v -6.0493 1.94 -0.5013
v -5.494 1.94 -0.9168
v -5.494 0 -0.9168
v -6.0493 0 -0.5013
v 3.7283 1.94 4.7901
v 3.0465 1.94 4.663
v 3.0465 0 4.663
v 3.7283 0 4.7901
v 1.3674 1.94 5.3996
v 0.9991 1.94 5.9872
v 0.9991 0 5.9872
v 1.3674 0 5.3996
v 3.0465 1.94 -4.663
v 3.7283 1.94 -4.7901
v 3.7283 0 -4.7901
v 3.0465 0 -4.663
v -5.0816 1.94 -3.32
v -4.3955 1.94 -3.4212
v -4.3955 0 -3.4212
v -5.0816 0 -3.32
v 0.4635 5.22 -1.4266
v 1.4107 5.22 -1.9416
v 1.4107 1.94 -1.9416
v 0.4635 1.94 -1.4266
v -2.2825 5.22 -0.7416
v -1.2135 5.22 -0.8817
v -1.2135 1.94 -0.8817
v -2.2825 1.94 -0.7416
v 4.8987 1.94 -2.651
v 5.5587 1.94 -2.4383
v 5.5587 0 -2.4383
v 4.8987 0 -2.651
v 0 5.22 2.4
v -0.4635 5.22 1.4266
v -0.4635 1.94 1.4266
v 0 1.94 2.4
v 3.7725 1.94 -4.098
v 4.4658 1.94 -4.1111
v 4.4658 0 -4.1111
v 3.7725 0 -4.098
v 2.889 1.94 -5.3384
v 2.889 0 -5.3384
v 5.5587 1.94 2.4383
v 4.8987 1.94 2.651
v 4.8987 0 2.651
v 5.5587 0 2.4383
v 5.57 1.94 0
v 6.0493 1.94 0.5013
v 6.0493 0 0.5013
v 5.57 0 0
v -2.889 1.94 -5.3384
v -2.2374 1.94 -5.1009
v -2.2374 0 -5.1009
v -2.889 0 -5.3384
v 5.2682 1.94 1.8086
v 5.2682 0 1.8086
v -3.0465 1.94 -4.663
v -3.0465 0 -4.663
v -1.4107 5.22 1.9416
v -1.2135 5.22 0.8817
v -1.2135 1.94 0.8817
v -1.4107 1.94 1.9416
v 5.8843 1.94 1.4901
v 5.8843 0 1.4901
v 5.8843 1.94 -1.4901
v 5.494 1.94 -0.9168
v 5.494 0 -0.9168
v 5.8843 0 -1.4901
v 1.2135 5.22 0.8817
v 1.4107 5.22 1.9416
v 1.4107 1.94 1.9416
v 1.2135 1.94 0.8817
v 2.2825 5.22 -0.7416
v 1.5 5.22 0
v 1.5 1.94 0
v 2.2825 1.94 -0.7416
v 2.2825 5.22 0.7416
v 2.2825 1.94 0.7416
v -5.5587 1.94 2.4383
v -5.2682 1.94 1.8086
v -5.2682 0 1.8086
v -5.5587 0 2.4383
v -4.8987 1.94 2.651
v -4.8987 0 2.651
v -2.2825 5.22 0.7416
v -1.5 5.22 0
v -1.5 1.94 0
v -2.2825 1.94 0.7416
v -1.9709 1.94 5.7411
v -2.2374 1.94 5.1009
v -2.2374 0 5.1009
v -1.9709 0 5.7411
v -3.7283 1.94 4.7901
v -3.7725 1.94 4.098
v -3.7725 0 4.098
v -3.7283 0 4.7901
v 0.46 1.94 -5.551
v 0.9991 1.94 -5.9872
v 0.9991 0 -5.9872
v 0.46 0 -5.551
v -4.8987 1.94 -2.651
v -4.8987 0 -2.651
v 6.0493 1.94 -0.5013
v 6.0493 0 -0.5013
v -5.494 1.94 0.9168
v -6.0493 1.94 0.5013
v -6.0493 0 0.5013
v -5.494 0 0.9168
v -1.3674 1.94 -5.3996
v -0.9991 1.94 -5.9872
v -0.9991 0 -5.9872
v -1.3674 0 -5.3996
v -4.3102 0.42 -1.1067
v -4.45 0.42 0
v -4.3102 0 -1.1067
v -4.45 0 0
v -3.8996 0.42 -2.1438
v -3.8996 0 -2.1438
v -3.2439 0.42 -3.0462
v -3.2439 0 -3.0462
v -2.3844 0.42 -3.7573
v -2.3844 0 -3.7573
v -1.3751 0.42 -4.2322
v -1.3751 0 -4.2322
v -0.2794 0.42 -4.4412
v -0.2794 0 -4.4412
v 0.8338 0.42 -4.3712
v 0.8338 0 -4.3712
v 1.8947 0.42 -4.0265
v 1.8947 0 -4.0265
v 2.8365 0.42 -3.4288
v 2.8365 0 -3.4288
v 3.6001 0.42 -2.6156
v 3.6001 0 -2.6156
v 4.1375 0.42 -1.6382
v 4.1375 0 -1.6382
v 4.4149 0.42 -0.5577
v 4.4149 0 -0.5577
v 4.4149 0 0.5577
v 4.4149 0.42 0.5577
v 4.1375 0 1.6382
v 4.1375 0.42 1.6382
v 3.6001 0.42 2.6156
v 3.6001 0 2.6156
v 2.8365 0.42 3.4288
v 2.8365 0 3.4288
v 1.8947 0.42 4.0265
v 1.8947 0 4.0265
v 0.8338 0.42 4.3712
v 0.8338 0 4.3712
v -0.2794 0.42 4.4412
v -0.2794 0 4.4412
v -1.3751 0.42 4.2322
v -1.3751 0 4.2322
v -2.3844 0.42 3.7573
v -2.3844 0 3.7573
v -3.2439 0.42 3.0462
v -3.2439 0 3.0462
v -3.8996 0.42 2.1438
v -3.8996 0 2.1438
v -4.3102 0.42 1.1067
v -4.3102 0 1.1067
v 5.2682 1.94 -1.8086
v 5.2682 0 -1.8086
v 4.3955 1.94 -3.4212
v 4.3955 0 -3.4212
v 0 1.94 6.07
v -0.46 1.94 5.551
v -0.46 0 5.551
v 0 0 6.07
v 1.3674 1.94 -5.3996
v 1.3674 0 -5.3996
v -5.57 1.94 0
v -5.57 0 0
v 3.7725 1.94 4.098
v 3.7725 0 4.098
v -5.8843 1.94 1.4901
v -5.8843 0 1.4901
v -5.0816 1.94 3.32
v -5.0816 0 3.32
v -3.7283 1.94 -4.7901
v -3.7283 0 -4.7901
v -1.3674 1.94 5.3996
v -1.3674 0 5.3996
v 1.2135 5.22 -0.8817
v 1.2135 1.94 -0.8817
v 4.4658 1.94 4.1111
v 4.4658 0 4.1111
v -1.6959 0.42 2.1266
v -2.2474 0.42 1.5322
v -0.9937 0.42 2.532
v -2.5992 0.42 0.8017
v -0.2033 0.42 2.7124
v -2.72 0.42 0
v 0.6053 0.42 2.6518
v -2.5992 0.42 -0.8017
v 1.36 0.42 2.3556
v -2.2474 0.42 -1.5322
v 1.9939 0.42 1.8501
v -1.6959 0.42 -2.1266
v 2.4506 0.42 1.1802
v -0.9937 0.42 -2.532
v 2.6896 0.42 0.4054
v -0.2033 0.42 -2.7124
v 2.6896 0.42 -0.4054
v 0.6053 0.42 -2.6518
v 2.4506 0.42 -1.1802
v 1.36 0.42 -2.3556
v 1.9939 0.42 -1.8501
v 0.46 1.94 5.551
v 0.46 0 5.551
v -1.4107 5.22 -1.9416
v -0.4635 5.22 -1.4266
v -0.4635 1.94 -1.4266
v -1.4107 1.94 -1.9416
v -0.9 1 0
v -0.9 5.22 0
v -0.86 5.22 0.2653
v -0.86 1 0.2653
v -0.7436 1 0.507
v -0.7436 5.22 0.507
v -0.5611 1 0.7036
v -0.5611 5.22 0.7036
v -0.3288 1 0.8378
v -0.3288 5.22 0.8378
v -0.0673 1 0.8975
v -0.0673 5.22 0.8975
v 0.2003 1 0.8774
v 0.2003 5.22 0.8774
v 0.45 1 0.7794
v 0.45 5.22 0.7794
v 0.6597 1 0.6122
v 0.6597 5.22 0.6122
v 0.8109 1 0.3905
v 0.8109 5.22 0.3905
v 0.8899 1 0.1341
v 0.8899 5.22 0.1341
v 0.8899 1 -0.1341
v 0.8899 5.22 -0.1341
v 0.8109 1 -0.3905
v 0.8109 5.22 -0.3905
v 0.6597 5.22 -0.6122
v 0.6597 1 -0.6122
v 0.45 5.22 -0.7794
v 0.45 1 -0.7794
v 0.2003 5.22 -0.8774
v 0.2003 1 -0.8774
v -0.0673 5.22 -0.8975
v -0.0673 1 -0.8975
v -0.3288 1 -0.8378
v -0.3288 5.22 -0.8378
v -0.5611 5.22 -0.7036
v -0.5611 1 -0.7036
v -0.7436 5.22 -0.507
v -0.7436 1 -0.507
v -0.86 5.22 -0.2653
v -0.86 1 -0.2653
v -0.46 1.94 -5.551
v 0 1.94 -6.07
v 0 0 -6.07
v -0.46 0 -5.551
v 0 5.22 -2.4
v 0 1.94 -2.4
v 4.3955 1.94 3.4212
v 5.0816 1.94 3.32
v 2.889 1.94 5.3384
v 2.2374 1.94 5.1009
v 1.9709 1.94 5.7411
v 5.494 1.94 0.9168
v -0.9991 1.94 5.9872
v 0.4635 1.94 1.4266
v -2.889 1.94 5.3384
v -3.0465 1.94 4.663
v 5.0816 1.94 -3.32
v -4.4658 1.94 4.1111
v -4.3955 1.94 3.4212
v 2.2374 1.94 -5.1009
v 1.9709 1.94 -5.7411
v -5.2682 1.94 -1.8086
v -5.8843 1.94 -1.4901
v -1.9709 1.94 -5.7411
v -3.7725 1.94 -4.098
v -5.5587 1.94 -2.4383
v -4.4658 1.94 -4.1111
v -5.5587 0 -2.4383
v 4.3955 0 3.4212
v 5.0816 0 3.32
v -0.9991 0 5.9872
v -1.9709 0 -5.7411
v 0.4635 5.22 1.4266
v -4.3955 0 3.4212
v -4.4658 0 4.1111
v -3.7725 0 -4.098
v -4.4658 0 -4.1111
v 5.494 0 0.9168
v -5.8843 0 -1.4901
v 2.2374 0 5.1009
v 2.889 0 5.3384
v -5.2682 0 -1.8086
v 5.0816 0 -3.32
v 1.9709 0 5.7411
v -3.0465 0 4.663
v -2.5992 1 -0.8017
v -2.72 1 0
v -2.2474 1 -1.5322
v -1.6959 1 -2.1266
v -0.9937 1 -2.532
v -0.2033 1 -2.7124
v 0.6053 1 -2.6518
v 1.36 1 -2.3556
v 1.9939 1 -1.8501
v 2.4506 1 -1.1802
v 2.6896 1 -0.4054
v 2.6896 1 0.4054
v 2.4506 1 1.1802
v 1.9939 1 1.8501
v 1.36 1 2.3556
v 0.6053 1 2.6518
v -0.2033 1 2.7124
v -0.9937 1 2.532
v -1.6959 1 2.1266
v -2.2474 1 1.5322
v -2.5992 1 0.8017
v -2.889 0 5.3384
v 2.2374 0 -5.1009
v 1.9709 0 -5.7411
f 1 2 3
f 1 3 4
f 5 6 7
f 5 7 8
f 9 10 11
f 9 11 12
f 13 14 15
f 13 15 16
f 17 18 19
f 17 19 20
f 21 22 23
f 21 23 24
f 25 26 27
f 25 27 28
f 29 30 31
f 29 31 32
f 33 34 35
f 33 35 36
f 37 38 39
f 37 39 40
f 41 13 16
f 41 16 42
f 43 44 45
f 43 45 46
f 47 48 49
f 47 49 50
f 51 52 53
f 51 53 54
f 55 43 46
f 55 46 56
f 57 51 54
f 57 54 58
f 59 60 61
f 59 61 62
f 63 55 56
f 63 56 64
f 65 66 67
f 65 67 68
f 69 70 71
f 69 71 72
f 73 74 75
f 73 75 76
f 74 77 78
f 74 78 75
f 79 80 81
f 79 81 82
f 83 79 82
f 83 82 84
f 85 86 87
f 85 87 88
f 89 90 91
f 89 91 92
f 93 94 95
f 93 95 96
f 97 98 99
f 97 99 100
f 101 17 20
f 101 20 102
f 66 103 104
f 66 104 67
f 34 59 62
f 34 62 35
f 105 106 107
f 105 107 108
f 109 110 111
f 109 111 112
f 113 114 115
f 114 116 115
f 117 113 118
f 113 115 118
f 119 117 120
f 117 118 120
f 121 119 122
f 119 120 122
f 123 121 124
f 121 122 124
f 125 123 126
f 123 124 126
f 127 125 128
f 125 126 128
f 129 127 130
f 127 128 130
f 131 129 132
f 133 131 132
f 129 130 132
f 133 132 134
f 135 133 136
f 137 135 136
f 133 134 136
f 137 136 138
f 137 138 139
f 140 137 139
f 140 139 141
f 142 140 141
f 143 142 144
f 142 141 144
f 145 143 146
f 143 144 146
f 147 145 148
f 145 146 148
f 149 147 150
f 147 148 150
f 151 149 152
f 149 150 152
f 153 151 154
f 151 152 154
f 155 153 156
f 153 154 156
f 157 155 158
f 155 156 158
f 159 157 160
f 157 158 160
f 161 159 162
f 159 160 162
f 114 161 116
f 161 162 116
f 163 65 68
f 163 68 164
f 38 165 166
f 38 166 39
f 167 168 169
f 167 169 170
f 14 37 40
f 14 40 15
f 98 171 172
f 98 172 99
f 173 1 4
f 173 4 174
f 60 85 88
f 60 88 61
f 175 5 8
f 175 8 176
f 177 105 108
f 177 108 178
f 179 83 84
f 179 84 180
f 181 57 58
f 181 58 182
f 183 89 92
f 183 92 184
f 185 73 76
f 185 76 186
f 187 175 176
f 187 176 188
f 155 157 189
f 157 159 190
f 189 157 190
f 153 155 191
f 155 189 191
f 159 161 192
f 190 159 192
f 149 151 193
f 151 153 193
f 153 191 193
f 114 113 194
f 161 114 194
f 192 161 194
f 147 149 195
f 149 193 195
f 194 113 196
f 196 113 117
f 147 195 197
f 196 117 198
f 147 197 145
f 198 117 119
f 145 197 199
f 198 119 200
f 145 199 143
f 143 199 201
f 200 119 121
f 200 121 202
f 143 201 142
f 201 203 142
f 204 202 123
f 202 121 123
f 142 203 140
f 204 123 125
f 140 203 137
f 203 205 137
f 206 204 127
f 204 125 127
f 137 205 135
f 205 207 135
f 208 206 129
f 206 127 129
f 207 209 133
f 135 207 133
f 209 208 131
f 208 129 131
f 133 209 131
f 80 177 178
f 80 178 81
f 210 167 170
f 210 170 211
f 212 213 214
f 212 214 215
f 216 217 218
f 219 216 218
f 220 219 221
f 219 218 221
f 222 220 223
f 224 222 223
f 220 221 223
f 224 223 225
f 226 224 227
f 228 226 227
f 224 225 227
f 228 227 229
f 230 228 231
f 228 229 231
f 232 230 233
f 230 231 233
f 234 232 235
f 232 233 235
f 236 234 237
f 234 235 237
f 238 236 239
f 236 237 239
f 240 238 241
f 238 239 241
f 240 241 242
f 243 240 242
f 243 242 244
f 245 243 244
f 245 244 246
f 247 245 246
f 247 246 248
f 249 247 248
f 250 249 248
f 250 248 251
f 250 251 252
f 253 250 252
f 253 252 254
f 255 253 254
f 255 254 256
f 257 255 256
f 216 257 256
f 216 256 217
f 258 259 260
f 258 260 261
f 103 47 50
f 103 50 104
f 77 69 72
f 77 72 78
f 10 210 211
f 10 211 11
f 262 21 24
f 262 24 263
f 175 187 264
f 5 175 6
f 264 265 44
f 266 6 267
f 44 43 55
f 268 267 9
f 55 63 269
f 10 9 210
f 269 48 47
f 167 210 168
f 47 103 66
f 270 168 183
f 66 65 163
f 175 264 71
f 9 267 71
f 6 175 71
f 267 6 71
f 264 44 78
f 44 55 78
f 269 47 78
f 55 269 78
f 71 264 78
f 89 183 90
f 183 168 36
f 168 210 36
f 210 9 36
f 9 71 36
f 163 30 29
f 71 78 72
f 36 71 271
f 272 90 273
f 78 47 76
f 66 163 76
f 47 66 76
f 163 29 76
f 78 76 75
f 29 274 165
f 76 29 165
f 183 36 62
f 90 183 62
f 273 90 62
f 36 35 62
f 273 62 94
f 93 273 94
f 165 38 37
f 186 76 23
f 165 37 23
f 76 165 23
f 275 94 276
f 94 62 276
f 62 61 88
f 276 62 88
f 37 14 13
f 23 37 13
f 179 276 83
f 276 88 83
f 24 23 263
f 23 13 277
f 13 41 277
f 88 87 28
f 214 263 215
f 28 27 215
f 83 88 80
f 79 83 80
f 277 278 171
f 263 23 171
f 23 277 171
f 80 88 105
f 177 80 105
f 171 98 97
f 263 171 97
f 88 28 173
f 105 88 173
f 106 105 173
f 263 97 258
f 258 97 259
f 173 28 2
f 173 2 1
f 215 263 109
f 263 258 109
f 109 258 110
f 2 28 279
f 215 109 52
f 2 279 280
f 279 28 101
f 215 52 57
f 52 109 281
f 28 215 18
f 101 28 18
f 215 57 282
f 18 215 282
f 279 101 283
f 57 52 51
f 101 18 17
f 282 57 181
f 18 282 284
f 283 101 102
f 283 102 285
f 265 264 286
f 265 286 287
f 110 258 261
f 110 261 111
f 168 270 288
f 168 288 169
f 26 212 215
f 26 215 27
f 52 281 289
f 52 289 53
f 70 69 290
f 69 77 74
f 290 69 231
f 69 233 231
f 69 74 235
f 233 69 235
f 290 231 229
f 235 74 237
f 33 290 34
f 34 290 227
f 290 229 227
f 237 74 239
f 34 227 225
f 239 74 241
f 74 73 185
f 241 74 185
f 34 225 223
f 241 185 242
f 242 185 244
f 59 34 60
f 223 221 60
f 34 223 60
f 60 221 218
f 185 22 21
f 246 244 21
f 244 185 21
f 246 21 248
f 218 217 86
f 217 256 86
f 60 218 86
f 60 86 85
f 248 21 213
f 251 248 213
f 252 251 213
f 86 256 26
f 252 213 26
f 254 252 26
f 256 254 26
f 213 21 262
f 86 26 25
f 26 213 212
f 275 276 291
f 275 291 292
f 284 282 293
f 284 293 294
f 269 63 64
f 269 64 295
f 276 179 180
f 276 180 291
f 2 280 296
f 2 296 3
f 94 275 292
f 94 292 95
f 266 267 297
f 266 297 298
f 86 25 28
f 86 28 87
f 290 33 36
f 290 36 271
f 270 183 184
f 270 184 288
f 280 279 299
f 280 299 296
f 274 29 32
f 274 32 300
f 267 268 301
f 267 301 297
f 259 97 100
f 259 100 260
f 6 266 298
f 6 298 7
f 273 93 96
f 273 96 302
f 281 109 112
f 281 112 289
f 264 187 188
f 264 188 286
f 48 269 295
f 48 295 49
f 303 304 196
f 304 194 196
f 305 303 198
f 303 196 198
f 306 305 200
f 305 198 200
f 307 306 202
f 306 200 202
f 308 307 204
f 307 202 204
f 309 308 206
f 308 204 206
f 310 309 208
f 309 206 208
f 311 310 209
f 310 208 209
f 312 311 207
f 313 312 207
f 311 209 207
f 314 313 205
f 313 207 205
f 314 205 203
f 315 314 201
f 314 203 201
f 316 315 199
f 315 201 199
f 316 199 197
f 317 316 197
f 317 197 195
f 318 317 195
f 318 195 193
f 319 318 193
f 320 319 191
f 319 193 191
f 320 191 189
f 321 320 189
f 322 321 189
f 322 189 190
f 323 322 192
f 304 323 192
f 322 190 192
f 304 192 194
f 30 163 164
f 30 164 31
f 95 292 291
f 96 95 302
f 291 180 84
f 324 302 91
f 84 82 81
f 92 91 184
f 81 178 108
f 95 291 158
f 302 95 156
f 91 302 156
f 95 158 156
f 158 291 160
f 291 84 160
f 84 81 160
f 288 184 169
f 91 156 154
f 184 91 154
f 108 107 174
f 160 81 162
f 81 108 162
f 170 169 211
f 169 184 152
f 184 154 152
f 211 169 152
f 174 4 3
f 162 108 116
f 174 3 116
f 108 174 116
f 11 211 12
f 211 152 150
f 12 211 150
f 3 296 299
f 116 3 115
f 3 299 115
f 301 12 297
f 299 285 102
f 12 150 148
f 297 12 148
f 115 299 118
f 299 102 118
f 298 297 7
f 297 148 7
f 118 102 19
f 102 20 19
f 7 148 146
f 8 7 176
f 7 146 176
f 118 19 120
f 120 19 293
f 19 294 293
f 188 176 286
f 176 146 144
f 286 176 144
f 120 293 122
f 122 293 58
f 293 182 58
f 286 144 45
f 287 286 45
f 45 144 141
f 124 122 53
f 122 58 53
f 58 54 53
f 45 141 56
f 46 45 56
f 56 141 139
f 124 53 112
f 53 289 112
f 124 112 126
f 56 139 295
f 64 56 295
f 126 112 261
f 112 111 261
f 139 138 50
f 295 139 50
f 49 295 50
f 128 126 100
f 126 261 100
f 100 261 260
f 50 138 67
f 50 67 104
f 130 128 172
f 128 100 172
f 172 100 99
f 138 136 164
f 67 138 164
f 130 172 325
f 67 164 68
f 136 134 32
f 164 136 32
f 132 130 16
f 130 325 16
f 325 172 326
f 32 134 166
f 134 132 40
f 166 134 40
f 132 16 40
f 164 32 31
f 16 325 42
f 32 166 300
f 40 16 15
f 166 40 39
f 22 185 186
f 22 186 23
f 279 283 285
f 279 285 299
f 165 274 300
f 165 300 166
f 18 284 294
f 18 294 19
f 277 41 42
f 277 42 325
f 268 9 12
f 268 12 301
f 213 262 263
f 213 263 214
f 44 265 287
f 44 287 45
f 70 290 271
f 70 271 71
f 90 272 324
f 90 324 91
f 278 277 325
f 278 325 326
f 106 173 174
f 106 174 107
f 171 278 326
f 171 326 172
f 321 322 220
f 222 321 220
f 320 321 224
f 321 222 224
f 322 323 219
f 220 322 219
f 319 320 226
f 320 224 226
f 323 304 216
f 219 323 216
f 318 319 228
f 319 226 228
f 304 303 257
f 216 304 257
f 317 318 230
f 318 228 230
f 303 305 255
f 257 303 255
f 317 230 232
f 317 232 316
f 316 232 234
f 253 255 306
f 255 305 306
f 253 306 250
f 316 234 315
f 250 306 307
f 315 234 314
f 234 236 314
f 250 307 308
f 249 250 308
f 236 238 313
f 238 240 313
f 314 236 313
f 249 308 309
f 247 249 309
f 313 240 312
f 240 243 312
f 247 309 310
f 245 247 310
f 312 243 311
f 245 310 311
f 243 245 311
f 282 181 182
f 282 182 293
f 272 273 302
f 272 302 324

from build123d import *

# Parameters (mm, degrees)
SKETCH2_R          = 6.57
CUT_EXTRUDE1_DEPTH = 10.189570175
SKETCH3_R          = 2.9
CUT_EXTRUDE2_DEPTH = 3.28
SKETCH4_R          = 0.9
CUT_EXTRUDE3_DEPTH = 11.034288305


with BuildPart() as part:
    # Sketch1 → Revolve1 (revolve)
    with BuildSketch(Plane.XY, mode=Mode.PRIVATE) as revolve1_sk:
        Polygon((0, 5.22), (0, 1), (2.72, 1), (2.72, 0.42), (4.45, 0.42), (4.45, 0), (6.07, 0), (6.07, 1.94), (2.4, 1.94), (2.4, 5.22), align=None)
    revolve(revolve1_sk.sketch.rotate(Axis((0, 5.22, 0), (0, -1, 0)), 180), axis=Axis((0, 5.22, 0), (0, -1, 0)))

    # Sketch2 → Cut-Extrude1 (cut, through all)
    with BuildSketch(Plane(origin=(0, 1.94, 0), x_dir=(1, 0, 0), z_dir=(0, 1, 0))):
        Circle(SKETCH2_R)
        Polygon((0, 6.07), (-0.459966954, 5.550975626), (-0.999089163, 5.987213112), (-1.367354163, 5.399559481), (-1.970925778, 5.741110657), (-2.237443515, 5.100857429), (-2.889000676, 5.33840567), (-3.046501241, 4.663017284), (-3.728271166, 4.790082892), (-3.772458354, 4.097982182), (-4.465844138, 4.11109914), (-4.395512637, 3.42116481), (-5.081600523, 3.31997532), (-4.898668794, 2.651026979), (-5.558744093, 2.438291228), (-5.268202036, 1.808576043), (-5.884259614, 1.490096907), (-5.49403246, 0.916791868), (-6.049267873, 0.501256627), (-5.57, 0), (-6.049267873, -0.501256627), (-5.49403246, -0.916791868), (-5.884259614, -1.490096907), (-5.268202036, -1.808576043), (-5.558744093, -2.438291228), (-4.898668794, -2.651026979), (-5.081600523, -3.31997532), (-4.395512637, -3.42116481), (-4.465844138, -4.11109914), (-3.772458354, -4.097982182), (-3.728271166, -4.790082892), (-3.046501241, -4.663017284), (-2.889000676, -5.33840567), (-2.237443515, -5.100857429), (-1.970925778, -5.741110657), (-1.367354163, -5.399559481), (-0.999089163, -5.987213112), (-0.459966954, -5.550975626), (0, -6.07), (0.459966954, -5.550975626), (0.999089163, -5.987213112), (1.367354163, -5.399559481), (1.970925778, -5.741110657), (2.237443515, -5.100857429), (2.889000676, -5.33840567), (3.046501241, -4.663017284), (3.728271166, -4.790082892), (3.772458354, -4.097982182), (4.465844138, -4.11109914), (4.395512637, -3.42116481), (5.081600523, -3.31997532), (4.898668794, -2.651026979), (5.558744093, -2.438291228), (5.268202036, -1.808576043), (5.884259614, -1.490096907), (5.49403246, -0.916791868), (6.049267873, -0.501256627), (5.57, 0), (6.049267873, 0.501256627), (5.49403246, 0.916791868), (5.884259614, 1.490096907), (5.268202036, 1.808576043), (5.558744093, 2.438291228), (4.898668794, 2.651026979), (5.081600523, 3.31997532), (4.395512637, 3.42116481), (4.465844138, 4.11109914), (3.772458354, 4.097982182), (3.728271166, 4.790082892), (3.046501241, 4.663017284), (2.889000676, 5.33840567), (2.237443515, 5.100857429), (1.970925778, 5.741110657), (1.367354163, 5.399559481), (0.999089163, 5.987213112), (0.459966954, 5.550975626), align=None, mode=Mode.SUBTRACT)
    extrude(amount=-CUT_EXTRUDE1_DEPTH, mode=Mode.SUBTRACT)

    # Sketch3 → Cut-Extrude2 (cut)
    with BuildSketch(Plane(origin=(0, 5.22, 0), x_dir=(1, 0, 0), z_dir=(0, 1, 0))):
        Circle(SKETCH3_R)
        Polygon((0, 2.4), (-0.463525492, 1.426584774), (-1.410684606, 1.941640786), (-1.213525492, 0.881677878), (-2.282535639, 0.741640786), (-1.5, 0), (-2.282535639, -0.741640786), (-1.213525492, -0.881677878), (-1.410684606, -1.941640786), (-0.463525492, -1.426584774), (0, -2.4), (0.463525492, -1.426584774), (1.410684606, -1.941640786), (1.213525492, -0.881677878), (2.282535639, -0.741640786), (1.5, 0), (2.282535639, 0.741640786), (1.213525492, 0.881677878), (1.410684606, 1.941640786), (0.463525492, 1.426584774), align=None, mode=Mode.SUBTRACT)
    extrude(amount=-CUT_EXTRUDE2_DEPTH, mode=Mode.SUBTRACT)

    # Sketch4 → Cut-Extrude3 (cut, through all)
    with BuildSketch(Plane(origin=(0, 5.22, 0), x_dir=(1, 0, 0), z_dir=(0, 1, 0))):
        with Locations(Location((0, 0, 0), (0, 0, 180))):
            Circle(SKETCH4_R)
    extrude(amount=-CUT_EXTRUDE3_DEPTH, mode=Mode.SUBTRACT)


solid = part.part
